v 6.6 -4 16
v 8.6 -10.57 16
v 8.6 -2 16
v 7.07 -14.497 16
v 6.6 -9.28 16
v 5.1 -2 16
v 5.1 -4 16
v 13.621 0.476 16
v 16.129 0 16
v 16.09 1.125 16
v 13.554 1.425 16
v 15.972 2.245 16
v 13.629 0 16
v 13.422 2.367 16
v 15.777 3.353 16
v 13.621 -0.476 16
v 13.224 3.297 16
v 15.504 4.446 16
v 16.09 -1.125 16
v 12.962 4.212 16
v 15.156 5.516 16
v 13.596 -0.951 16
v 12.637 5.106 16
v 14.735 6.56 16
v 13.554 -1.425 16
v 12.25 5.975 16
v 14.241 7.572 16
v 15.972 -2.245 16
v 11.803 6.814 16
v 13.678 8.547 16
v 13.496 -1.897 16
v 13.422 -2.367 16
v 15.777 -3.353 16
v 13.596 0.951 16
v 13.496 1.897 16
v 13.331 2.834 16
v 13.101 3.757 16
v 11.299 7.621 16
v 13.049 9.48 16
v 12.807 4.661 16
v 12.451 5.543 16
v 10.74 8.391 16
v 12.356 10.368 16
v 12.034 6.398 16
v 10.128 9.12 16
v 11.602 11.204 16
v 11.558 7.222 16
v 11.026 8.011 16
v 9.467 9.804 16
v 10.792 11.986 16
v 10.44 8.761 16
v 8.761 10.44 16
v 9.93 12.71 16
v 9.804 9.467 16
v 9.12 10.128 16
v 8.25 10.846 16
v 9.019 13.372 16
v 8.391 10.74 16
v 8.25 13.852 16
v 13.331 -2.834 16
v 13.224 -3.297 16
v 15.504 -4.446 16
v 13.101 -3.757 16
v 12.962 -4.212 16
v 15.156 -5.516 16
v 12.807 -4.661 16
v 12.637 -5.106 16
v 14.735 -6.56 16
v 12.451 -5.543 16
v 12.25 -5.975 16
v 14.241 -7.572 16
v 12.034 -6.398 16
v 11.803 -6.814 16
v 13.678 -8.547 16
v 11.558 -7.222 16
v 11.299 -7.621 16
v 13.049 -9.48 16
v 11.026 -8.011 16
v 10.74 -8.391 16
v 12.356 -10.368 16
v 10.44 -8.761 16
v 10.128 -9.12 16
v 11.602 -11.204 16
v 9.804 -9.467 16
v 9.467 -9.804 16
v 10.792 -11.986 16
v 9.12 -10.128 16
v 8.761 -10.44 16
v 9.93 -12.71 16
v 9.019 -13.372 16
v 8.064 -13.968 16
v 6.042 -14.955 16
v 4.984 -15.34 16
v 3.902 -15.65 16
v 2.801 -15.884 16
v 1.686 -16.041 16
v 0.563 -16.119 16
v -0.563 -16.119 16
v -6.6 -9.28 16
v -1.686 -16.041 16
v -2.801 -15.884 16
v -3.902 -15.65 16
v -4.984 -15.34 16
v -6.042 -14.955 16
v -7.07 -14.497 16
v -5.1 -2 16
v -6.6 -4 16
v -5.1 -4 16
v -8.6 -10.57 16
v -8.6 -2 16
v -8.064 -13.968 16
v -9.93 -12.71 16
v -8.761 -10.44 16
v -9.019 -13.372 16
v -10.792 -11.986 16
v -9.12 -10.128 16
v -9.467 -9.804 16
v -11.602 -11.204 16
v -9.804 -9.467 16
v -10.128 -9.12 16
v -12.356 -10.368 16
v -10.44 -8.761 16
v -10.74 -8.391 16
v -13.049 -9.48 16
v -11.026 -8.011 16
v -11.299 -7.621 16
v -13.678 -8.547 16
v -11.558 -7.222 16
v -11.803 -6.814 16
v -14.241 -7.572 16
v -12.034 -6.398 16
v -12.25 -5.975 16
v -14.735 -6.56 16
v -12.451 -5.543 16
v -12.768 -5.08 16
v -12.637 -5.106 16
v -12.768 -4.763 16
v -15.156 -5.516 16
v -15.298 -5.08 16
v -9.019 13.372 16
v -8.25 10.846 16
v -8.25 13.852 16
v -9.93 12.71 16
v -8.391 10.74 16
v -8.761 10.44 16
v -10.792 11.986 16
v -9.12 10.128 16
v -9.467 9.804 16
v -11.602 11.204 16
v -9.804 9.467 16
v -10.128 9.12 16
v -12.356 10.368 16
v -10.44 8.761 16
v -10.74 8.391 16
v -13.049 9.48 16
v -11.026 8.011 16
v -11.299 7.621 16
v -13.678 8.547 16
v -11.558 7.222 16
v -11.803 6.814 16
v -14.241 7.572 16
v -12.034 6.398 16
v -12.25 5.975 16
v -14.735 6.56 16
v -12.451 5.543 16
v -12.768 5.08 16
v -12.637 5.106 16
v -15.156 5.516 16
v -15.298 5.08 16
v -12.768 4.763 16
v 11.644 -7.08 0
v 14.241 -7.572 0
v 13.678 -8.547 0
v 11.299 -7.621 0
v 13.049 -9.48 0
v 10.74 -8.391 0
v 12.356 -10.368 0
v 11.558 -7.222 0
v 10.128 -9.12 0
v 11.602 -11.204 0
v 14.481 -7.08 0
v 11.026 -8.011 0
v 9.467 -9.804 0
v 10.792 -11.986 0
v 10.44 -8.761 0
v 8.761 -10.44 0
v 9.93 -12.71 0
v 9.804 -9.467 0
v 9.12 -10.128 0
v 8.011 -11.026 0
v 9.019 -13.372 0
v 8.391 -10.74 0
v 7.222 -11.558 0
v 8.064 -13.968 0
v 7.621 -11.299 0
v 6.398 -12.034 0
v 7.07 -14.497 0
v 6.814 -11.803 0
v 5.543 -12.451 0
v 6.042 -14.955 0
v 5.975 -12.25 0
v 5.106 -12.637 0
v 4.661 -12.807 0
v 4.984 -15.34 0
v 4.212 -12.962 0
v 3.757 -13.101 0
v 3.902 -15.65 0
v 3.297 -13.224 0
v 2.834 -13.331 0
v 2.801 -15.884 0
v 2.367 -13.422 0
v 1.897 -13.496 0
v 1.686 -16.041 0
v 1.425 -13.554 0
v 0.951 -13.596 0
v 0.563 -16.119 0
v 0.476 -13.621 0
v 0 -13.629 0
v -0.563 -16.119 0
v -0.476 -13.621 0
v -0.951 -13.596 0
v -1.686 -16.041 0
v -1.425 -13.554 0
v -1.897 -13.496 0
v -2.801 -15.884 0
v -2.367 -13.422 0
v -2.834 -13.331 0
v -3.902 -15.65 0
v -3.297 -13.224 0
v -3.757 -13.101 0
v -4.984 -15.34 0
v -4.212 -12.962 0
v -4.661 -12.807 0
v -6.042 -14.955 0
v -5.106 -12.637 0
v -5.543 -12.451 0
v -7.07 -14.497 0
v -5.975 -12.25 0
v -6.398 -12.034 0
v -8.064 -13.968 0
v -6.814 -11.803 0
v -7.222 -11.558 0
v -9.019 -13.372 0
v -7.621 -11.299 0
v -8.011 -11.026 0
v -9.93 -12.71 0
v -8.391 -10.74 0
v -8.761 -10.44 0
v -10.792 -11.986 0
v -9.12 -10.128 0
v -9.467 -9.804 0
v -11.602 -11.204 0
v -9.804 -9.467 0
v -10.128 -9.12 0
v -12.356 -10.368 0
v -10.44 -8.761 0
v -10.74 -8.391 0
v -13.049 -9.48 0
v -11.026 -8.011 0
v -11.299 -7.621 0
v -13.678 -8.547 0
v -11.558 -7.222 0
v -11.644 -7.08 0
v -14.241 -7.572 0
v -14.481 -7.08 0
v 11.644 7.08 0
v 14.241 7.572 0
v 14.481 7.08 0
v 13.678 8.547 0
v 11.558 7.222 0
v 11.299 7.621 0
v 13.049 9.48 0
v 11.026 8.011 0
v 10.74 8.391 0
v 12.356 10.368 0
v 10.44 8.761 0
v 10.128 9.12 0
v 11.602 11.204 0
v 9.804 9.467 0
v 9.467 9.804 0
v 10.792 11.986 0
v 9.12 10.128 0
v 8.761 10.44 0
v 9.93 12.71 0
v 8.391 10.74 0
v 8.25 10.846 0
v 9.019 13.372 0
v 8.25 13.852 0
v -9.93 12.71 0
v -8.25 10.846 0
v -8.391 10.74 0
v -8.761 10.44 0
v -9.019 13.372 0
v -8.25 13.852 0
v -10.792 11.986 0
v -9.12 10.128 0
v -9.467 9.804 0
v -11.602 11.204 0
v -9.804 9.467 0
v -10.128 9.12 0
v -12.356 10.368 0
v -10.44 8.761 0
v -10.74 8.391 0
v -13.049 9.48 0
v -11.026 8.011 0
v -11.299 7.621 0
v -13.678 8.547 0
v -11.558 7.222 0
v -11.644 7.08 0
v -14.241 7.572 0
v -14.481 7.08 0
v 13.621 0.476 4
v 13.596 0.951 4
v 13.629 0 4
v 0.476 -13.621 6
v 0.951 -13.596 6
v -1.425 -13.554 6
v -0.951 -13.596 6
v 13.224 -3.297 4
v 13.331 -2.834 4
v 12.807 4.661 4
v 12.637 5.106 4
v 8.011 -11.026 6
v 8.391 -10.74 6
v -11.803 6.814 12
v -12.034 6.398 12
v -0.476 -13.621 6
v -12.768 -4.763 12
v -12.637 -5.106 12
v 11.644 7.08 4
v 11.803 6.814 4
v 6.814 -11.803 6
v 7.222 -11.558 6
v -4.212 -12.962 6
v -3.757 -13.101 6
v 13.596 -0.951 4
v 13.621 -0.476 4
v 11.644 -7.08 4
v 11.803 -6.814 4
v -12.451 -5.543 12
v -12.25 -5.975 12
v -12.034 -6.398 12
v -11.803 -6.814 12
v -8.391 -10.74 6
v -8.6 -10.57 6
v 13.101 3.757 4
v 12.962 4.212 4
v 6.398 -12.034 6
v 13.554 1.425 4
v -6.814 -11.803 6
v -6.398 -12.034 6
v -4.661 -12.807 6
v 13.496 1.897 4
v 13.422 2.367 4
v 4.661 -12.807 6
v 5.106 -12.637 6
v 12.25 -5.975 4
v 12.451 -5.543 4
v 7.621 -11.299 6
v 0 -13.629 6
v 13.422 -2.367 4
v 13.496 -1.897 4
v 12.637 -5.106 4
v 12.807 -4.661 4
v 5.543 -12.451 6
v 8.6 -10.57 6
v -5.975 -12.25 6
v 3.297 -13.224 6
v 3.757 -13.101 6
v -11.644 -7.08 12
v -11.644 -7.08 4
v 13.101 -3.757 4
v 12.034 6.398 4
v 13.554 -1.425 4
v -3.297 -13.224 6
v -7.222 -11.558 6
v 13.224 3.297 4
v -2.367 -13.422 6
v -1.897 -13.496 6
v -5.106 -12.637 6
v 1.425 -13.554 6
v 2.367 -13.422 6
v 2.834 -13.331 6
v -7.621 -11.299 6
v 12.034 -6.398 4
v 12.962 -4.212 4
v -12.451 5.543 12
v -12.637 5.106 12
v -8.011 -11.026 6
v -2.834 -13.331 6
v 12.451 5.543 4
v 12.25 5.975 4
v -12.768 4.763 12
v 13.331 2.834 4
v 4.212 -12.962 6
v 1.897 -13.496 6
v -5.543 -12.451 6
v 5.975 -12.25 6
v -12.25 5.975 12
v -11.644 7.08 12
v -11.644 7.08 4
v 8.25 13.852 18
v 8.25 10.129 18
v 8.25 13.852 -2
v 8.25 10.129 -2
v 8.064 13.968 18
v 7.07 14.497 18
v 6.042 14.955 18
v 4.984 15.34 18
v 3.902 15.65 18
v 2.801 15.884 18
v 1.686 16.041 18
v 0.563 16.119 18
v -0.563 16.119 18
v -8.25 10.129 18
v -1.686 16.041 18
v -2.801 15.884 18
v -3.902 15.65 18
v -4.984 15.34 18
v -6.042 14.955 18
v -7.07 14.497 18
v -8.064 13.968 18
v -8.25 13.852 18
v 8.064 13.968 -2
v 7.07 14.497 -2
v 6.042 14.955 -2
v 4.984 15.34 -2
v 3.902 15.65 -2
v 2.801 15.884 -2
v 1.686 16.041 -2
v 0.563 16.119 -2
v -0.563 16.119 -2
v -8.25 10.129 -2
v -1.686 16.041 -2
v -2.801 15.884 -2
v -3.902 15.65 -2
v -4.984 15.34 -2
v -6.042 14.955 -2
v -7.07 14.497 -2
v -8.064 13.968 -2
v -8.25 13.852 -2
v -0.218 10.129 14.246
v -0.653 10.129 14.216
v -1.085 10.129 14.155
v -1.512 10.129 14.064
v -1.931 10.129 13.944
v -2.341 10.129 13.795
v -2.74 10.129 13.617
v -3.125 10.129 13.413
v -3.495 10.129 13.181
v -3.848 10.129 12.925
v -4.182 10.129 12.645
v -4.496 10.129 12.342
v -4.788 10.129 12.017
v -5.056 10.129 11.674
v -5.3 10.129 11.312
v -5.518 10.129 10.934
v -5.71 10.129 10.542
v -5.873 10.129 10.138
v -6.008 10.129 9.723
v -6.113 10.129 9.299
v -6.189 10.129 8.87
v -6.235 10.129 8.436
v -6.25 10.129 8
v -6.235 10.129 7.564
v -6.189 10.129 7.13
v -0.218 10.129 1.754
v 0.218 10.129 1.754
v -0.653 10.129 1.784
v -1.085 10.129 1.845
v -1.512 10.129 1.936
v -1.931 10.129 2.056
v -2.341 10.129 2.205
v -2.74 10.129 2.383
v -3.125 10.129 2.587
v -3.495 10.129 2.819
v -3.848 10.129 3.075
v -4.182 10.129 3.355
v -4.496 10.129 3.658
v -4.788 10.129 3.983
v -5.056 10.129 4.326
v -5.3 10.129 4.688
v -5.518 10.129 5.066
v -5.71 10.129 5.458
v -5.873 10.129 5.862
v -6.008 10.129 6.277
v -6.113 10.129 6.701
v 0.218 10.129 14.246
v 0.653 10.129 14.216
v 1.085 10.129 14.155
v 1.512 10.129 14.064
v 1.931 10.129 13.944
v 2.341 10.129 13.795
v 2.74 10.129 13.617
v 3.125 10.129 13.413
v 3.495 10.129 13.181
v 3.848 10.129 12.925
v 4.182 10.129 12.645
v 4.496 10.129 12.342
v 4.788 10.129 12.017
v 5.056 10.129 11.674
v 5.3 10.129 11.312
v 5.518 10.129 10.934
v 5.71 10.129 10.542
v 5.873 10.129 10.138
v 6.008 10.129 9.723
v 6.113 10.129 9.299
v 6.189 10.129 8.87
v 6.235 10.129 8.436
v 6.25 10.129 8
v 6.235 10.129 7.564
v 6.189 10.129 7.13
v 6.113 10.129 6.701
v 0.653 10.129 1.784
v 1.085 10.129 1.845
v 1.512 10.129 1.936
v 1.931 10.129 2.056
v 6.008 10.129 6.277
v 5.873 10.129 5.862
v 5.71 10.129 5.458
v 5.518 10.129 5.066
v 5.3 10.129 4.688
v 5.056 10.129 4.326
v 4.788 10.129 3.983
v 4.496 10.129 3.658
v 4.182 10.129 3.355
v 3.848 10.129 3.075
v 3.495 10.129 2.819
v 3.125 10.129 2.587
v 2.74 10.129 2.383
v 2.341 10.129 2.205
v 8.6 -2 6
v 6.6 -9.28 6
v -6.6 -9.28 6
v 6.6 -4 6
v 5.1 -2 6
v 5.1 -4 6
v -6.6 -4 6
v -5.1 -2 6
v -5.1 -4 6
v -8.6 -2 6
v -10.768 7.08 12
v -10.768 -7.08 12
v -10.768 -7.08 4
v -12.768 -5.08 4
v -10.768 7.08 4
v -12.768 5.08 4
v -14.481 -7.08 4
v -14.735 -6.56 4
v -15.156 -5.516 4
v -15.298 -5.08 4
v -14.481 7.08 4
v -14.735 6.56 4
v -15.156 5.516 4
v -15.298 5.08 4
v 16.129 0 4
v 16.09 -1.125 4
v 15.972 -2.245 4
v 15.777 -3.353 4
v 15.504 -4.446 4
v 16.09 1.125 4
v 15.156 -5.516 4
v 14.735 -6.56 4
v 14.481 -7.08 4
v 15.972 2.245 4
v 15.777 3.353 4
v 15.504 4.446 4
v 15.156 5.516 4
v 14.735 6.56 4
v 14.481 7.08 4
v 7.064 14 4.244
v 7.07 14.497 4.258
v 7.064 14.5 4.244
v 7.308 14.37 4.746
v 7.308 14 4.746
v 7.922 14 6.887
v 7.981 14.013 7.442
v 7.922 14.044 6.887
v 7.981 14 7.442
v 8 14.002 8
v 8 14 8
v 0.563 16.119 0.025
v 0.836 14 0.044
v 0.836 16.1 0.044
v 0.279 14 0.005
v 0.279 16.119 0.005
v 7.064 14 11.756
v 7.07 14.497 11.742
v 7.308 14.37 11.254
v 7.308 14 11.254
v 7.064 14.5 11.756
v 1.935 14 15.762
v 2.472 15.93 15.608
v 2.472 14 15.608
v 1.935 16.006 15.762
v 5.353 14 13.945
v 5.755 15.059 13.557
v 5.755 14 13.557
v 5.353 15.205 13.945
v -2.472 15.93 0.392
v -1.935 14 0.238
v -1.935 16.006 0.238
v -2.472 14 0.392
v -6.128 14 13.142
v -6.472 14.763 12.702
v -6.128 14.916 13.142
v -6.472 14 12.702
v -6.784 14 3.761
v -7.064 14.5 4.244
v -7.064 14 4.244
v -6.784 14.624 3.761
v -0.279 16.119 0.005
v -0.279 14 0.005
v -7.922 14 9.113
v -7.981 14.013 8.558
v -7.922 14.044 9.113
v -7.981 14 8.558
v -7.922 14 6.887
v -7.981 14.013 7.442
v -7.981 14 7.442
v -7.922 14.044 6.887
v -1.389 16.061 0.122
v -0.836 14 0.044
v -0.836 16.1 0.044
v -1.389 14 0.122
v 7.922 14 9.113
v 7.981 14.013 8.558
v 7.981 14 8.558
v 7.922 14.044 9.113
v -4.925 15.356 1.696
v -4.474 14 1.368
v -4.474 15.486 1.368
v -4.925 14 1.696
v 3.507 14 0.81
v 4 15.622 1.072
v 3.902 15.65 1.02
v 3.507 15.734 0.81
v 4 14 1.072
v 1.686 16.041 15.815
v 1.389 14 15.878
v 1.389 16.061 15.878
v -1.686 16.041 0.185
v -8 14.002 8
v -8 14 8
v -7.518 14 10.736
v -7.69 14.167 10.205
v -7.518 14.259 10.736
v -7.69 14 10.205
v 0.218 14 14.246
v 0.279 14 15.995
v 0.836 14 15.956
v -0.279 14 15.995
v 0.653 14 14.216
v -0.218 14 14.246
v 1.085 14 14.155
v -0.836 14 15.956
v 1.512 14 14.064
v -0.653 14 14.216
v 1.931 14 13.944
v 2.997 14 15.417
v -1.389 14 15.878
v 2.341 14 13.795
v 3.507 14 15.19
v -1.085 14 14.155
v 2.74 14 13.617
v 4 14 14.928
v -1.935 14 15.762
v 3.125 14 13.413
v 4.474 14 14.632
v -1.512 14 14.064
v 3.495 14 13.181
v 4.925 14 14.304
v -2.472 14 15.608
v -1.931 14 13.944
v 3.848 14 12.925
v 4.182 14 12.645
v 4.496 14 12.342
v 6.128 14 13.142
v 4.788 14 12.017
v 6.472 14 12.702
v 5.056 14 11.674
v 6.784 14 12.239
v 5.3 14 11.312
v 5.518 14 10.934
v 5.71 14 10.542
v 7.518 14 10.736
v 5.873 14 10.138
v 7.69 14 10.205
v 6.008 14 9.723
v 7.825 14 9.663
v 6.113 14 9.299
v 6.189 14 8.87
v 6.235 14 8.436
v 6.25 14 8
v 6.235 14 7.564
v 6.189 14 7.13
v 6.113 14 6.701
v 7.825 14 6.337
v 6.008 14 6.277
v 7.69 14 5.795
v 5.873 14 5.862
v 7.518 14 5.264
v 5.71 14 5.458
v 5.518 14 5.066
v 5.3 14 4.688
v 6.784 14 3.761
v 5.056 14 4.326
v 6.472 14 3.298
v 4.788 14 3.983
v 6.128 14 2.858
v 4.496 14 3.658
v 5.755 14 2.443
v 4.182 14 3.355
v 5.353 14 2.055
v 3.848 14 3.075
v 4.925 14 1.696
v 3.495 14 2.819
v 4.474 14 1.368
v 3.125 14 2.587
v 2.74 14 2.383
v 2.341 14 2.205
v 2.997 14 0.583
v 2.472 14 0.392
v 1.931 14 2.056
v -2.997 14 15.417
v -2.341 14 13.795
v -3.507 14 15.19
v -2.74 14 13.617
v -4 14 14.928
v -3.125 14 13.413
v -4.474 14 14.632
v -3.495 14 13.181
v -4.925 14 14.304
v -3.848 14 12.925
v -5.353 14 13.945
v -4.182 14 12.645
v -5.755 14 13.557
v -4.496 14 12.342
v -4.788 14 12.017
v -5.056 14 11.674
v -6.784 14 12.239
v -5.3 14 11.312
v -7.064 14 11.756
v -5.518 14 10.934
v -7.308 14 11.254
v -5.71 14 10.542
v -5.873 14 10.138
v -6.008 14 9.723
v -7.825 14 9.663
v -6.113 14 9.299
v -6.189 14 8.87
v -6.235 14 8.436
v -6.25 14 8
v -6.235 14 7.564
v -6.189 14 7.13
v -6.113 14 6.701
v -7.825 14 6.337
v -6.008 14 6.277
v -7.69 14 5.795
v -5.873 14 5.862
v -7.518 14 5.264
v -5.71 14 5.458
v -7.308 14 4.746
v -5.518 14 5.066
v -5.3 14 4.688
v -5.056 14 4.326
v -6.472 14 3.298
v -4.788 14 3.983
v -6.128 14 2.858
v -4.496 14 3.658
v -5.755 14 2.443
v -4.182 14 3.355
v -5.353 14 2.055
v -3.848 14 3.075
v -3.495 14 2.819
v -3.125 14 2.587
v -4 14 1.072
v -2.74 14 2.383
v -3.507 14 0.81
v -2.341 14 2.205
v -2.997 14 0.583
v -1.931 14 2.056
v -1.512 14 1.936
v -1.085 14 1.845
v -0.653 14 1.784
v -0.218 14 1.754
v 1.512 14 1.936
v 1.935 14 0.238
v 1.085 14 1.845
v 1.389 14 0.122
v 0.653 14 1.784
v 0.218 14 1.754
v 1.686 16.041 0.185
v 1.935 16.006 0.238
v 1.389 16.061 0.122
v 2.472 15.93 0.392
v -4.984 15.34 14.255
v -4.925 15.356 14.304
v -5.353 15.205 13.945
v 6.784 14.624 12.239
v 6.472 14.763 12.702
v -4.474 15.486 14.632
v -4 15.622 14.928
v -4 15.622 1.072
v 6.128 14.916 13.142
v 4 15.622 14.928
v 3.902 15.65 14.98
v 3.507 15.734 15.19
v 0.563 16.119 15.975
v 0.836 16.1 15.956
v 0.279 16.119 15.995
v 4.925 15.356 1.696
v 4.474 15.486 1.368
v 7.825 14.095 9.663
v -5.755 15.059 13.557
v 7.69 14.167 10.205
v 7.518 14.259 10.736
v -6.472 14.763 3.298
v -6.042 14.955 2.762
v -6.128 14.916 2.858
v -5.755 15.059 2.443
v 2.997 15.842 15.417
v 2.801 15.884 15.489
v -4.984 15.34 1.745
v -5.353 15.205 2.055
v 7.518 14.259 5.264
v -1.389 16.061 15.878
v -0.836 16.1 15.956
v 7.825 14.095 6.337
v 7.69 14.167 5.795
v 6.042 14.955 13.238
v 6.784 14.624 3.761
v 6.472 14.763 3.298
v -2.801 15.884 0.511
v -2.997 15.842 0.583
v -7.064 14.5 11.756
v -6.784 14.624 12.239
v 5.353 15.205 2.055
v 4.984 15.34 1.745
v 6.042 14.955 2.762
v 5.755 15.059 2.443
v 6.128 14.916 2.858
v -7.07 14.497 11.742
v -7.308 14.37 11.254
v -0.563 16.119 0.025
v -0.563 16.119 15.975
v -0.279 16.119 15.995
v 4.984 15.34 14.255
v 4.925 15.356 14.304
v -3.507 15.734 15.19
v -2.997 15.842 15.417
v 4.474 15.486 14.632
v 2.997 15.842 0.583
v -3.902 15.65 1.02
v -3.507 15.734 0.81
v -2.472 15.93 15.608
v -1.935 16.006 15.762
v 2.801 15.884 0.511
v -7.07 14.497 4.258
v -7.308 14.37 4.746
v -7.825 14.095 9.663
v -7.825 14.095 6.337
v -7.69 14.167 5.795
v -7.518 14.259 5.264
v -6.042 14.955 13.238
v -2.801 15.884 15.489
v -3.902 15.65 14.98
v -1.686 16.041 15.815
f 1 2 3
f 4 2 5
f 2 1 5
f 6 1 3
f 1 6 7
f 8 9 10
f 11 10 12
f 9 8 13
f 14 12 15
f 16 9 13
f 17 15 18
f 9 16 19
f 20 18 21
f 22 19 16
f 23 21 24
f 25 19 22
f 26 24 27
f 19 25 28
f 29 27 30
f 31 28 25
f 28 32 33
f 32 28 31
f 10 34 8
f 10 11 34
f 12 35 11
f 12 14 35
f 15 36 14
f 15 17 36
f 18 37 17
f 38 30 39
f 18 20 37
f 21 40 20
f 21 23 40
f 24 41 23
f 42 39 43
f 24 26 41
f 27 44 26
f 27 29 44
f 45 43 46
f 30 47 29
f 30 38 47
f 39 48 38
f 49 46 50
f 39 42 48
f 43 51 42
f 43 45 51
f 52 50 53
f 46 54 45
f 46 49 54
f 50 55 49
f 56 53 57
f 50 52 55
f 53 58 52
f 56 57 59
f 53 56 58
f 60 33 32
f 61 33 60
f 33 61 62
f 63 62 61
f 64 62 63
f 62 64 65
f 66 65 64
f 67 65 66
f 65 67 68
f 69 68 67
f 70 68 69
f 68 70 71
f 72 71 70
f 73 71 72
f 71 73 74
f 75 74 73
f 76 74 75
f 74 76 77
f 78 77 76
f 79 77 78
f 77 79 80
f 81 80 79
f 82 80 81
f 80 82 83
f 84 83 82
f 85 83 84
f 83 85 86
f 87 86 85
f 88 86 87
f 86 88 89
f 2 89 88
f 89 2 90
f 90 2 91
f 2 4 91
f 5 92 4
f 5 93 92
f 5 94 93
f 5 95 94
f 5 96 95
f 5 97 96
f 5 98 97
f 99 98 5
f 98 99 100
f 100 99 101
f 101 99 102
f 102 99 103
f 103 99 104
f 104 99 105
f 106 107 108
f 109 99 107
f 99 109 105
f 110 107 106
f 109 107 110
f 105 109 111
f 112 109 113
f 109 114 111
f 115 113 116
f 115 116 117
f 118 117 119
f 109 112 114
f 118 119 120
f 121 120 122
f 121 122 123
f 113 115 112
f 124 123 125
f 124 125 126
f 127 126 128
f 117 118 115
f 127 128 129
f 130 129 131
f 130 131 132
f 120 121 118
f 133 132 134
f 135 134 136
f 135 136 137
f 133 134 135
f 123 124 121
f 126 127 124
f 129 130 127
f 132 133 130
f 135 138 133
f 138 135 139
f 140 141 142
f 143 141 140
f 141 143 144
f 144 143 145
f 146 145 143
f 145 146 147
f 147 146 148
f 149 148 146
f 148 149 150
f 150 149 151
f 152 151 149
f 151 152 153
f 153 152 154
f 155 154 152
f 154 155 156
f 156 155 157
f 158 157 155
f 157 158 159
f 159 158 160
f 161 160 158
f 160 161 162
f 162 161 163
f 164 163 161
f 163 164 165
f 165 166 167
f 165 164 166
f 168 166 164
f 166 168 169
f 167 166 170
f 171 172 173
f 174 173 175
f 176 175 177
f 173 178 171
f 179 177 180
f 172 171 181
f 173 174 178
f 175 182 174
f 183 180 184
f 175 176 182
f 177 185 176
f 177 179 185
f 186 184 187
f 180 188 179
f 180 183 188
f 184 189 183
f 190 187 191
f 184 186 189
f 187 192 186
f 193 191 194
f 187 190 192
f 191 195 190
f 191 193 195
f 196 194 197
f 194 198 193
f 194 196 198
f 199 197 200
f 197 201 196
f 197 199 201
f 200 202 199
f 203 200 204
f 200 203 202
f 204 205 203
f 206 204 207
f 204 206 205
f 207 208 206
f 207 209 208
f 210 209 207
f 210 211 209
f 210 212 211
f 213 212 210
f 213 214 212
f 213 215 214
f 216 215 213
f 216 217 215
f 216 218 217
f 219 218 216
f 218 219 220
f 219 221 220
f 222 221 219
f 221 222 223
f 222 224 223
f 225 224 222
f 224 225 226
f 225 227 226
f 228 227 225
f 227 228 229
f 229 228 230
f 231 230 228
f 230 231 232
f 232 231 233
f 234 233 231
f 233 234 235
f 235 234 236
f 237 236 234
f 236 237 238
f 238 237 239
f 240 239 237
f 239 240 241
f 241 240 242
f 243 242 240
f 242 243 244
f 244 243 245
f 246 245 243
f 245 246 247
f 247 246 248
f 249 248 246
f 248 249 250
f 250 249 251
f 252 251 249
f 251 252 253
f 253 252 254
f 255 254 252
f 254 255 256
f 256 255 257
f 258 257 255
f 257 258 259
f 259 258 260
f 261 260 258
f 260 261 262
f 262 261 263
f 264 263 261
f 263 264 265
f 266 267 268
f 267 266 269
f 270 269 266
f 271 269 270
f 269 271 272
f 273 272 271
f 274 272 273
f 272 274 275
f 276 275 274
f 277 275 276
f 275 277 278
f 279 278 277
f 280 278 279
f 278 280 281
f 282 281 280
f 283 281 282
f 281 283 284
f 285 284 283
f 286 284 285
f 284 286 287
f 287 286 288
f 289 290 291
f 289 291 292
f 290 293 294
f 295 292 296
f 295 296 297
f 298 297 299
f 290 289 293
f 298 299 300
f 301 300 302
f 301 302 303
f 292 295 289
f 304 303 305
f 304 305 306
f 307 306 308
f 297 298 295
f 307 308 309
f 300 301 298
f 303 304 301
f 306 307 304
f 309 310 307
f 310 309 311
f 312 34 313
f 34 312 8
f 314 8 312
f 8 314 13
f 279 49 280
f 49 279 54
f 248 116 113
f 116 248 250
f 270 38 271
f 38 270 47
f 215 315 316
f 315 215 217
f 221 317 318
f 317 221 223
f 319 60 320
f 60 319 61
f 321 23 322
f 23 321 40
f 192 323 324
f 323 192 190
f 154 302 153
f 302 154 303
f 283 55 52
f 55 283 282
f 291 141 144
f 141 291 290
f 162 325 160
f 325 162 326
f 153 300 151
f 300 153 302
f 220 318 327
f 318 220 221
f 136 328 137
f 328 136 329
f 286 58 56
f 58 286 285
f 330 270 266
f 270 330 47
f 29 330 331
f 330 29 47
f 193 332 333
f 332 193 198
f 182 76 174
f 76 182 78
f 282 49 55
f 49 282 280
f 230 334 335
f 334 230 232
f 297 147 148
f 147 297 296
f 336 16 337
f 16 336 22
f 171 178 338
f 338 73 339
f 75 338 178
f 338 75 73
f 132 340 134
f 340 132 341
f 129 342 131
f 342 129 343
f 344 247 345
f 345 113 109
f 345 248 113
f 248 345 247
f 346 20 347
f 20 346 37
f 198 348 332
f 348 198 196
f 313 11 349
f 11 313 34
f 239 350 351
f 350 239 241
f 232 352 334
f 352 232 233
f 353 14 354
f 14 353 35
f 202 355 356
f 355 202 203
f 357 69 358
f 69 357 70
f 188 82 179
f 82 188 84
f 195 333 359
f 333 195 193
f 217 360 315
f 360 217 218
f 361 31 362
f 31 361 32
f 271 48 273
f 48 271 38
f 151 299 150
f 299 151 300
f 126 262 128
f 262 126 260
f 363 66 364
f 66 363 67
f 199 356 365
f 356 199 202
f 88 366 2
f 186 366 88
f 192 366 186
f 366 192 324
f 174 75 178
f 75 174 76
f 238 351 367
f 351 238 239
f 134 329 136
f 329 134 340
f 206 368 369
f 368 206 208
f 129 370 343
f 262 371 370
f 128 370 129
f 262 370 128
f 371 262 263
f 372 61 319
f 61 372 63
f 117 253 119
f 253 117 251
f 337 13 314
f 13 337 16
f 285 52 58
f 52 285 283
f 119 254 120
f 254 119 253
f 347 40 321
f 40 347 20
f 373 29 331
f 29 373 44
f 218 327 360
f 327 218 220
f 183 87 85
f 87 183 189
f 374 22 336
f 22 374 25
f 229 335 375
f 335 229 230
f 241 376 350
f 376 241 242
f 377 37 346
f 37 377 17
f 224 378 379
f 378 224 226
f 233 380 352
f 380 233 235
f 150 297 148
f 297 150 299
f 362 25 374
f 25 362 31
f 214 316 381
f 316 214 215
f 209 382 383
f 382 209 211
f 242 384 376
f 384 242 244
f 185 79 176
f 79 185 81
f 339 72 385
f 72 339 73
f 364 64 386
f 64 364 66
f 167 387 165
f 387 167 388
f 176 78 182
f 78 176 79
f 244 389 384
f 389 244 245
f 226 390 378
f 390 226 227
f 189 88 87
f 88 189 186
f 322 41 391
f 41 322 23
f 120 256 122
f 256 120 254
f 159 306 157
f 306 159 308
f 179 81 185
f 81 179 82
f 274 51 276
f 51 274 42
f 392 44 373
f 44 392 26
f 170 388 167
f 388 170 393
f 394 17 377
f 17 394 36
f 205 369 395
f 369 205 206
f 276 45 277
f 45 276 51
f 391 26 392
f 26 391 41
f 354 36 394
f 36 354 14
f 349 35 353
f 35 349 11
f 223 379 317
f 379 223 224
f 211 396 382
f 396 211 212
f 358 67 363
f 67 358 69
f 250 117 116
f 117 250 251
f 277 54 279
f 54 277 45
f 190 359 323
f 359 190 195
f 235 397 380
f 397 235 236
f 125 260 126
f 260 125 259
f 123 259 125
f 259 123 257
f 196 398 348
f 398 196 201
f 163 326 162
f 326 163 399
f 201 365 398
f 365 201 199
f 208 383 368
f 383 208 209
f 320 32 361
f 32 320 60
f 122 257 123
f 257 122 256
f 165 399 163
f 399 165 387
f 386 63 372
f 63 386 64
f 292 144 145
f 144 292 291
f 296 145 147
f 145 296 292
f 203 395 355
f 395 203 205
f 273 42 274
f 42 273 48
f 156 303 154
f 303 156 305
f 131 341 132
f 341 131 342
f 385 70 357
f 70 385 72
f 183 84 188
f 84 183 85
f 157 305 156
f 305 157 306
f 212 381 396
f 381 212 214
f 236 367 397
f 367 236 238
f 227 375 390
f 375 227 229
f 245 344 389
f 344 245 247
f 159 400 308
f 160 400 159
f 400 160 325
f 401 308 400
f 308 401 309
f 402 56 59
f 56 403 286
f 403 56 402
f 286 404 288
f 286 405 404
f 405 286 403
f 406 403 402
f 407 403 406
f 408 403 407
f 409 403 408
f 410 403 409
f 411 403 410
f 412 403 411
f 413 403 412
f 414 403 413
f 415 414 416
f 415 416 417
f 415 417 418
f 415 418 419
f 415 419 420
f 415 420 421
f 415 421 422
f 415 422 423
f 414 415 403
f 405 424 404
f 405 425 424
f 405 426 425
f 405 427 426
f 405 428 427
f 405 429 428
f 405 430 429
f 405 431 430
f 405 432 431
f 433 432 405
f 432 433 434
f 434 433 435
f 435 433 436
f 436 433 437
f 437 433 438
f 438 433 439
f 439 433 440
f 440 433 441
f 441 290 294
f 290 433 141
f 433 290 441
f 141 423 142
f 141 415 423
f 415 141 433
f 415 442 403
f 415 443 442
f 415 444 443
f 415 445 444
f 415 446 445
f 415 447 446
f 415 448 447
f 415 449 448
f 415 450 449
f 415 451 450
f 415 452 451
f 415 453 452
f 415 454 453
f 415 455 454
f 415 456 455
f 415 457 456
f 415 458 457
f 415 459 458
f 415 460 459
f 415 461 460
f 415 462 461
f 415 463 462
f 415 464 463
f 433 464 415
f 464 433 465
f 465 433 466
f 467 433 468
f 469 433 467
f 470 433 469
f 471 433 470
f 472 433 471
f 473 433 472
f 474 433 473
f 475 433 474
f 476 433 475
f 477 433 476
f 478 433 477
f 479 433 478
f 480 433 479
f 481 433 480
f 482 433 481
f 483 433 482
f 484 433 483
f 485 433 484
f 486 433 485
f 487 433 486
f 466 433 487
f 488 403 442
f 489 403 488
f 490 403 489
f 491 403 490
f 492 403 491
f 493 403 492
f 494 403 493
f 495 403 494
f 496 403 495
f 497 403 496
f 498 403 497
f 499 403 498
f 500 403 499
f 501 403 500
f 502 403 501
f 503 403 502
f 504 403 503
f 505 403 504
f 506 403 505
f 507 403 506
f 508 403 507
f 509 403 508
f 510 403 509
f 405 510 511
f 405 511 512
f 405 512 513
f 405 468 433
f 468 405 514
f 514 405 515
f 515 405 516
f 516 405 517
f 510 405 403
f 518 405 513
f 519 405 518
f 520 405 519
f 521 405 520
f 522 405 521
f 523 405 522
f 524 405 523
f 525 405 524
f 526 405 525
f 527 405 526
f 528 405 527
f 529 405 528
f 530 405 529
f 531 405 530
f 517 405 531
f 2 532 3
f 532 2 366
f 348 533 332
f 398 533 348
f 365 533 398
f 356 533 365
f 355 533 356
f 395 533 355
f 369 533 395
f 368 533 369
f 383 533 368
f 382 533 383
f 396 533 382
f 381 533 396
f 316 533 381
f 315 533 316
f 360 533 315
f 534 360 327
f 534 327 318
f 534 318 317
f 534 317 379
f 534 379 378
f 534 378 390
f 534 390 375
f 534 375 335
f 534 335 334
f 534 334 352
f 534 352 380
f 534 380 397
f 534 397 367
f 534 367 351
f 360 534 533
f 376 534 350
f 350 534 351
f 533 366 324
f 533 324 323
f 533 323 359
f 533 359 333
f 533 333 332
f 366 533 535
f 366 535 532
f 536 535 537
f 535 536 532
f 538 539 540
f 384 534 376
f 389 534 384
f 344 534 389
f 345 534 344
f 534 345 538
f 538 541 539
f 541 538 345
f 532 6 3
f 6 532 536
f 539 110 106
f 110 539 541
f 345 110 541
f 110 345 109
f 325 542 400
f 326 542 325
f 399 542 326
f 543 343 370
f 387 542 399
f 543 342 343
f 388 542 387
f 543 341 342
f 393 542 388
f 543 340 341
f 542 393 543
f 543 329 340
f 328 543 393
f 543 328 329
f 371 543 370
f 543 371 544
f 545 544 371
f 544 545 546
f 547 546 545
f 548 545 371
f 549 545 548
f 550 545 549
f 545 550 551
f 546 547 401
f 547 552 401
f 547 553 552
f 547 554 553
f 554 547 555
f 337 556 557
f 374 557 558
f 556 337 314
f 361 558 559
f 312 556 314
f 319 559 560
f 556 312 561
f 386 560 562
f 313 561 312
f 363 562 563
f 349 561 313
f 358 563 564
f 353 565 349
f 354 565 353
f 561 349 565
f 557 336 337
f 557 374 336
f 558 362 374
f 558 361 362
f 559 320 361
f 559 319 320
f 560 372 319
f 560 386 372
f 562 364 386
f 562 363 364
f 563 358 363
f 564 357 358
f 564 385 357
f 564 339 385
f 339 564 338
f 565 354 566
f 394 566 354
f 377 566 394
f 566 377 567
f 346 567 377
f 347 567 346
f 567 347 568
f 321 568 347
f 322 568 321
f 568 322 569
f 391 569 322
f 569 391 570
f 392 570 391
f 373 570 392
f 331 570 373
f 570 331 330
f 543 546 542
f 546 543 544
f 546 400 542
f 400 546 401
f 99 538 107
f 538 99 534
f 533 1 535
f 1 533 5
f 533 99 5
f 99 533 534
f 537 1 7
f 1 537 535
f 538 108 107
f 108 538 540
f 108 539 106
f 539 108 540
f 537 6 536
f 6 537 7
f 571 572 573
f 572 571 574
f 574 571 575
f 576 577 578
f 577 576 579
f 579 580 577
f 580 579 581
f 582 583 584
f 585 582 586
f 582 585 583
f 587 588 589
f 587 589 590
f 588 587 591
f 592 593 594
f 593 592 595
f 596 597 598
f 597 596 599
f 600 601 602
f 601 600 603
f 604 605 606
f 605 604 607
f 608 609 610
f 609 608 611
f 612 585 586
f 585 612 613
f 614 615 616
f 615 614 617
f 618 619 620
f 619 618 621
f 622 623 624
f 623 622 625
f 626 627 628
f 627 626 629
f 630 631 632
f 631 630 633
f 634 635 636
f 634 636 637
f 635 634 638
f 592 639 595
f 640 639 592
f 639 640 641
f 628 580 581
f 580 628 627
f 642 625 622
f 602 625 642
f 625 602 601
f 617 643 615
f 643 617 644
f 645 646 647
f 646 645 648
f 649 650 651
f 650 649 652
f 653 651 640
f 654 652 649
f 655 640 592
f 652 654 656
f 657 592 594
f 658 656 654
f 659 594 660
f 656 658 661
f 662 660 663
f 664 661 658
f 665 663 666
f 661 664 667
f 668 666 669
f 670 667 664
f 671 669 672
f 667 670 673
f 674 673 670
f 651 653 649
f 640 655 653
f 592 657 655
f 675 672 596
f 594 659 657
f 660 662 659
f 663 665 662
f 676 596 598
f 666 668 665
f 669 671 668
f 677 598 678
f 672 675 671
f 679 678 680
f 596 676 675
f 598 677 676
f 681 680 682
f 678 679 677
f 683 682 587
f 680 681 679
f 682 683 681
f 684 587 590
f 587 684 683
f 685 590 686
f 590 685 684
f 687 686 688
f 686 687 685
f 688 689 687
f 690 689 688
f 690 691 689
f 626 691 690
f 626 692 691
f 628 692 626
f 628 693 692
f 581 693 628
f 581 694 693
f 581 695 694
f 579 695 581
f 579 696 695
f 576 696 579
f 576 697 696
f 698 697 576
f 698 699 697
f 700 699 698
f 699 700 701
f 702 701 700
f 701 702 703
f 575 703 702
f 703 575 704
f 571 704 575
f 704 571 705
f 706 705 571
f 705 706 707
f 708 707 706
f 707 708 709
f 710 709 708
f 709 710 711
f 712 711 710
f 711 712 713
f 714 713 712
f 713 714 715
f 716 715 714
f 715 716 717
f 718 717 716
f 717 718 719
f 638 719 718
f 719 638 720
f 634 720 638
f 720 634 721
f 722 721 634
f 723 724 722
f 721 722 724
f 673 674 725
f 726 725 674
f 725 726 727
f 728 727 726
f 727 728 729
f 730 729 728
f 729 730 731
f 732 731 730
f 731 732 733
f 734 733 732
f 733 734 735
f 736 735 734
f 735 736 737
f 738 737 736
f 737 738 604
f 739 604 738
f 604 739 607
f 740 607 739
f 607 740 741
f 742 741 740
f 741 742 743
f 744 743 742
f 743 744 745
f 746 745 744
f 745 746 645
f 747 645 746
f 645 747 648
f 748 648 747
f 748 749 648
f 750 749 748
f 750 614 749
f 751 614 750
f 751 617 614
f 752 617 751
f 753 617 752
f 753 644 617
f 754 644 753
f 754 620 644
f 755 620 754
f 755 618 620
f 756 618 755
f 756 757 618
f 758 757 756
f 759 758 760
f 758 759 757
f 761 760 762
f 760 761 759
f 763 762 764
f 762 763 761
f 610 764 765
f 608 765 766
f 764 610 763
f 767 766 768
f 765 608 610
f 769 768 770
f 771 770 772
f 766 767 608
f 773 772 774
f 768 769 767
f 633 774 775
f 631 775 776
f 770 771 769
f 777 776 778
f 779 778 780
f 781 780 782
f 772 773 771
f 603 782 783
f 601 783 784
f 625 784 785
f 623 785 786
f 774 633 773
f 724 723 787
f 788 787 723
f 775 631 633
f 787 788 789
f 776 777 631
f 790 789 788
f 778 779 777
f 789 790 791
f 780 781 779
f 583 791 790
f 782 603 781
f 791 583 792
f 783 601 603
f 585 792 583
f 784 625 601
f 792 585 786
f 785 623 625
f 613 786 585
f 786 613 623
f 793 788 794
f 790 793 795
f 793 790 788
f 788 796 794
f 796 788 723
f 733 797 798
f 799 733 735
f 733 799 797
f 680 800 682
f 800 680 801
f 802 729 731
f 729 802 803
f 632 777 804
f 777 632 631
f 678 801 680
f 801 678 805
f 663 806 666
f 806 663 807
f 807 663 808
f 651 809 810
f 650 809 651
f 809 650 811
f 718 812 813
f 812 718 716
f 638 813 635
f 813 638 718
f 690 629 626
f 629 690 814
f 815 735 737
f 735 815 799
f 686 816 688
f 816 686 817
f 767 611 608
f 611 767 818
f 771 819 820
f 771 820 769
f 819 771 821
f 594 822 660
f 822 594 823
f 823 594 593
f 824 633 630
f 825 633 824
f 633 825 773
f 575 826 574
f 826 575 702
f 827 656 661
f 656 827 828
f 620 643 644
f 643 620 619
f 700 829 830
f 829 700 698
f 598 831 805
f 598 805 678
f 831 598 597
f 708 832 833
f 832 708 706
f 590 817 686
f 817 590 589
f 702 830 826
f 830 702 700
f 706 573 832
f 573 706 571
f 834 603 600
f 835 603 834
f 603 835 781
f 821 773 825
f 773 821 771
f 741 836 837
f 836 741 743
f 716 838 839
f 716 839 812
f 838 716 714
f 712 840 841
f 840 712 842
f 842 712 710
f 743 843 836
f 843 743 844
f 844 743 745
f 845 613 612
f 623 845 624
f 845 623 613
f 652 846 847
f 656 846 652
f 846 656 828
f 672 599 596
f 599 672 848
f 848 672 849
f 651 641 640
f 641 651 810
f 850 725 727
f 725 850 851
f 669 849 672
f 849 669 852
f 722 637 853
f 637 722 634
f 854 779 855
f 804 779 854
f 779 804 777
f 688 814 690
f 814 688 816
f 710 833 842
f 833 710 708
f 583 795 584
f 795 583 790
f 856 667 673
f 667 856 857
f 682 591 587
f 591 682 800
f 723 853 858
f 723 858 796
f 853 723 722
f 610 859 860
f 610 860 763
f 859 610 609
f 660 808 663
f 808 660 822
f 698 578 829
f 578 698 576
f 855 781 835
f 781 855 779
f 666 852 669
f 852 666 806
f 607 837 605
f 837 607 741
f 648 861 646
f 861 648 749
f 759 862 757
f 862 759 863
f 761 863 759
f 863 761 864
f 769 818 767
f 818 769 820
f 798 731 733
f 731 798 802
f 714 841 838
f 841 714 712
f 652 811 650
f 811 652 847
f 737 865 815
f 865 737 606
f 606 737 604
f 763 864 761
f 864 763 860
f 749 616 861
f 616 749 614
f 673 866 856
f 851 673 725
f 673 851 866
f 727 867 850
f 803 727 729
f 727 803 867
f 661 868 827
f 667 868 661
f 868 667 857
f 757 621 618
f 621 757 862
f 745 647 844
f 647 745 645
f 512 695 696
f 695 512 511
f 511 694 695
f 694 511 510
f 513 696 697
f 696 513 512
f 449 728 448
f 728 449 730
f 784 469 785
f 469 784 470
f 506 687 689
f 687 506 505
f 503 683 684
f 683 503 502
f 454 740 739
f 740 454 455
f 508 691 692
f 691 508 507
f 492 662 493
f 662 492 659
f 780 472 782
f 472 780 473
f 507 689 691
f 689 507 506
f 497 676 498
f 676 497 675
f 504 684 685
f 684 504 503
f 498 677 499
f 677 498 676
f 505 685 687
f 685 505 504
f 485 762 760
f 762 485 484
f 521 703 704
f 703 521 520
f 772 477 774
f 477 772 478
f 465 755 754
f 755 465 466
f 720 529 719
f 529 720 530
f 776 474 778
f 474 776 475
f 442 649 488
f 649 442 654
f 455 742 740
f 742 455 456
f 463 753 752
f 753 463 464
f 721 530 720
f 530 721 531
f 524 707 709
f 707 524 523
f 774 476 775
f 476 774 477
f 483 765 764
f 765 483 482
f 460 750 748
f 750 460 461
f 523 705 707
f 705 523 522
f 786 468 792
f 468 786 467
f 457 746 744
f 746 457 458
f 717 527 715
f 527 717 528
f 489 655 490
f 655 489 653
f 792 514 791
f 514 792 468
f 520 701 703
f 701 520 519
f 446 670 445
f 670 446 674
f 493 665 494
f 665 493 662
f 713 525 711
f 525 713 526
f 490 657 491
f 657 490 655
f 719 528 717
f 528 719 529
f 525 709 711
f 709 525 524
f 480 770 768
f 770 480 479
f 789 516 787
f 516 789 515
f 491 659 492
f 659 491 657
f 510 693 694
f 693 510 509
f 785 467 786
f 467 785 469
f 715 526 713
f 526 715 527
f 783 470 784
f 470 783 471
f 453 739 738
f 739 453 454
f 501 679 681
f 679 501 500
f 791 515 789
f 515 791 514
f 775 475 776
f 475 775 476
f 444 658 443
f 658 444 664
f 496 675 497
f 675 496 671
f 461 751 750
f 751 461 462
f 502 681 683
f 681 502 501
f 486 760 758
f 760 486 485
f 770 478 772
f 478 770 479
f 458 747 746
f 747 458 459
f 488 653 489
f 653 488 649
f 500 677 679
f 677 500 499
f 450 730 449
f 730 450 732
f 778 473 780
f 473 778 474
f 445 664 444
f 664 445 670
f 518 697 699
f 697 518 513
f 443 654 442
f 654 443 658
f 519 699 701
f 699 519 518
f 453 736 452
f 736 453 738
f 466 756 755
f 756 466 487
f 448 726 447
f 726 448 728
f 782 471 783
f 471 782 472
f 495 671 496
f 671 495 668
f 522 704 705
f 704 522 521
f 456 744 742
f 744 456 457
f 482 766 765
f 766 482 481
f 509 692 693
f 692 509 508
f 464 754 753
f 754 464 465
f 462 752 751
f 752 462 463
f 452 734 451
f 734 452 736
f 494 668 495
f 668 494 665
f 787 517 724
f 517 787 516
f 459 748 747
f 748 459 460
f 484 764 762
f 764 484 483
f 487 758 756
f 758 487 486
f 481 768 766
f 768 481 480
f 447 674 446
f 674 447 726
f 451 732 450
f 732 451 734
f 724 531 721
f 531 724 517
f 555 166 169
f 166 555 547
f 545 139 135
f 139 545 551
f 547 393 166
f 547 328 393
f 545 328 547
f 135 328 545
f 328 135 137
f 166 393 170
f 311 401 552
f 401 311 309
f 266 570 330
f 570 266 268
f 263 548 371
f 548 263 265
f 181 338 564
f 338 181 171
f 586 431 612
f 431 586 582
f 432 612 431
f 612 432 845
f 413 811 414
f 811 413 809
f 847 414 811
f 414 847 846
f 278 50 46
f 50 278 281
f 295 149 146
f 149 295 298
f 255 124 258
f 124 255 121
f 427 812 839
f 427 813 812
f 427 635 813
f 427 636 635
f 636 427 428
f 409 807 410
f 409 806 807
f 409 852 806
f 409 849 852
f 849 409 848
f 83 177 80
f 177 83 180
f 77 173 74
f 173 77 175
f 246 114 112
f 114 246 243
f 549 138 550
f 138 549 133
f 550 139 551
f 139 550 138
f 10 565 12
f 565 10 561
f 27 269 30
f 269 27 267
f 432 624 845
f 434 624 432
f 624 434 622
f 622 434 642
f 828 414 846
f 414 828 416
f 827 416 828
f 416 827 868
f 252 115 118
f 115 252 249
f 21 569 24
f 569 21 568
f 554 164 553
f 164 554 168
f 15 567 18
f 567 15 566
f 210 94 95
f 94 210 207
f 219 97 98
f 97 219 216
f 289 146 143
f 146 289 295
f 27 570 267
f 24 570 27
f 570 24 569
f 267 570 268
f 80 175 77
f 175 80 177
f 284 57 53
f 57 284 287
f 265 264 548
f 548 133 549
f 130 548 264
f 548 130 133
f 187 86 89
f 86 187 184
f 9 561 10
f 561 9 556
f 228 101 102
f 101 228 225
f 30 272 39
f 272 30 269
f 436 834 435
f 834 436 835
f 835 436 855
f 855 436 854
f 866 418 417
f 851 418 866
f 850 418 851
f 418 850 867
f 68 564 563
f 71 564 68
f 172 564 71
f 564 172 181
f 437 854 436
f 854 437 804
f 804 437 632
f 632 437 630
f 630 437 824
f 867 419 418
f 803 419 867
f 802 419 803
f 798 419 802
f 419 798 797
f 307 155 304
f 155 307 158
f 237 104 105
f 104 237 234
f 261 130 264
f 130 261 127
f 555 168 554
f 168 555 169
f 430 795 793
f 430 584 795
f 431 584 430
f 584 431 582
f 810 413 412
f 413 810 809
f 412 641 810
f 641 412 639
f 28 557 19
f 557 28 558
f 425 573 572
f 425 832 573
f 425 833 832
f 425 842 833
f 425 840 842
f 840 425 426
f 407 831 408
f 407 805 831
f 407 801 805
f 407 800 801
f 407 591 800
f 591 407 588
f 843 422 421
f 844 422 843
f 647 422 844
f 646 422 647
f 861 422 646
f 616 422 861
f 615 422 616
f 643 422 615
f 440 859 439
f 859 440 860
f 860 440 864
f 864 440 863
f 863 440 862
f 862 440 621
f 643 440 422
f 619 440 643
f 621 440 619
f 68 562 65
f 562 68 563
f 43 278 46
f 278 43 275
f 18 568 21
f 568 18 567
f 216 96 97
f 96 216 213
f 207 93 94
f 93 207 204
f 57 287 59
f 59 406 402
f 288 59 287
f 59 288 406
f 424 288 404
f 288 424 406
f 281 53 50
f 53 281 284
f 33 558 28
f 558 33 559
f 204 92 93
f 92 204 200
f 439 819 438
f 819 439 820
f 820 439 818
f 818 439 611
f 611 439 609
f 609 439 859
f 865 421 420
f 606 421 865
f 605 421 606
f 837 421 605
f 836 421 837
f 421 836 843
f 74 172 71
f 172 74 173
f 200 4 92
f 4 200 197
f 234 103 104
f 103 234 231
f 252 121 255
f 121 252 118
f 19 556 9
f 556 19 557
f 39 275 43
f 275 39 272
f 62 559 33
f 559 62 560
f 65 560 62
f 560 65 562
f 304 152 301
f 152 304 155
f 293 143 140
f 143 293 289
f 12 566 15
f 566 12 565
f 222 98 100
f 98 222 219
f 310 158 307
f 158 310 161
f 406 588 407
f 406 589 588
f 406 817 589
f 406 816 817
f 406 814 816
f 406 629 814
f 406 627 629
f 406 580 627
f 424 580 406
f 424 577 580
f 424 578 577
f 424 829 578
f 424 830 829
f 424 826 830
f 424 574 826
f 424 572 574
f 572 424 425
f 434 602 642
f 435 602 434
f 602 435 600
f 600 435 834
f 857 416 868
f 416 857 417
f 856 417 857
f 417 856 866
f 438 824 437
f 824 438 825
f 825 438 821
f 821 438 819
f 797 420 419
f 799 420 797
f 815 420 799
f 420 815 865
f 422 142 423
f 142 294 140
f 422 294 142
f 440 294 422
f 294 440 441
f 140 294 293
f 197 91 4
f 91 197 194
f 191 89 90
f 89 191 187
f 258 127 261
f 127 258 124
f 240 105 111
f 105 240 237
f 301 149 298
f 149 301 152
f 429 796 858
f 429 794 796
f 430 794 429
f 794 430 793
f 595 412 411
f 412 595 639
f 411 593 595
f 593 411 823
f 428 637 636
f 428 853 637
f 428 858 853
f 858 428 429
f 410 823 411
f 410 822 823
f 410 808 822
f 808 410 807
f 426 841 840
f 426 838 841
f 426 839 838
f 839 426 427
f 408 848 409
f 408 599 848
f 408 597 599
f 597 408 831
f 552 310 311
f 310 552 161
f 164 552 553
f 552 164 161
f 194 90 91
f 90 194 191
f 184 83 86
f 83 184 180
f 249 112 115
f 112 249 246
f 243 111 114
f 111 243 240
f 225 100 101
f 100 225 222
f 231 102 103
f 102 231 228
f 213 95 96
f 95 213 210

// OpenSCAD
// file: dim.scad
FACES 				= 180;
EPSILON 			= 0.1;

INCHES_TO_MM 		= 25.4;
MM_TO_INCHES 		= 1 / INCHES_TO_MM;

// Marks - absolute location.
M_WAY_BACK          = -40;
M_POMMEL            = -37;    // approximate. hard to measure.
M_SPEAKER_BACK      = -36;
M_0                 = 0;        // physical back of the lightsaber main body.
M_AFT_STOP          = 10;
M_DISPLAY           = 14;       // was 15

// GOLD
//M_PORT_CENTER       = 57.5;
// SILVER
M_PORT_CENTER       = 58.0;

M_PORT_BUTTRESS     = 63.5;
M_CRYSTAL_VIEW_CENTER = 93;
M_FRONT_BUTTRESS    = 104.0;

H_FAR               = 200;

// inner diameter of the lightsaber tube.
// shock is constant, within tolerances
D_INNER      		= 32.258;    	// 1.225 -> 1.250 -> 1.270
R_INNER 			= D_INNER / 2;
D_OUTER             = 37.6;
D_AFT               = 25.8;
R_AFT               = D_AFT / 2;
D_AFT_RING          = 33.5;
H_AFT_RING          = 6;
H_AFT_LIP           = 4;

H_SPEAKER = 3.6 + 0.2;  // space for the physical speaker
X_SPEAKER = 20;
Y_SPEAKER = 14.2;   
Y_SPEAKER_INNER = 8.4;  // air channel
H_SPEAKER_HOLDER = H_SPEAKER + 2;

// emitter head
D_EMITTER_RING      = 33.4;

// dimensions of the main ring.
H_RING 				= 16;
T_RING 				= 2.5;

// dimensions of pin holders and pins
PIN	   				= 2.54;
H_PIN_HOLDER 		= 8;
T_PIN_HOLDER_WALL 	= 2;

N_TEETH				= 2;
TEETH_ANGLE			= 90;

// Pin counts:
X_EMITTER 			= 4;
Y_EMITTER 			= 1;

H_BUTTRESS			= 3;       // internal buttress / baffles
W_PCB				= 18;      // This is the pcb width
H_PCB				= 6;       // But the height varies a *lot*
W_CRYSTAL           = 12.1;
H_CRYSTAL           = 9; //8.2;
D_CRYSTAL_TIP       = 5.5;
H_CRYSTAL_HOLDER    = 8.0;
CRYSTAL_Y           = 8;        // offset up of the crystal

DISPLAY_W           = 23;
DISPLAY_L           = 32;
DISPLAY_MOUNT_W     = 17;
DISPLAY_MOUNT_L     = 26;
D_DISPLAY_MOUNT     = 2;
Y_DISPLAY           = 9.5;

D_SWITCH			= 12.5;						// actually 12, by thread.

X_ROD               = 10.5;
Y_ROD               =  3.5;
D_ROD               =  3.4;

H_BATTERY           = 68;
D_BATTERY           = 18.50 + 0.5;    // An 1850. Huh. 
BATTERY_DROP        = 1;

Z_NOTCH             = H_BUTTRESS / 2;
NOTCH_DEPTH         = 2;
NOTCH_WIDTH         = 3;
RAIL_WIDTH          = 4;
NOTCH_ANGLE_0       = 195;
NOTCH_ANGLE_1       = -20;

X_DOTSTAR           = 5.0;  // from spec
Y_DOTSTAR           = 1.4;  // from spec

OFFSET_EMITTER = -PIN + sqrt(R_INNER * R_INNER - PIN * PIN * X_EMITTER * X_EMITTER / 4);

module emitterPin(h, longY)
{
	Y = longY ? 40 : PIN;

    translate([-X_EMITTER * PIN / 2, OFFSET_EMITTER, 0]) {
        cube([X_EMITTER * PIN, Y, h]);
    }	
}

module emitterHolder(h)
{
    translate([-X_EMITTER * PIN / 2, OFFSET_EMITTER, 0]) {
    	translate([-T_PIN_HOLDER_WALL, -T_PIN_HOLDER_WALL, 0]) {
      		cube([X_EMITTER * PIN + T_PIN_HOLDER_WALL*2, PIN + T_PIN_HOLDER_WALL*2, h]);
    	}
    }	
	
}

// Uses the same dimensions as the emitter holder so they 
// can be used interchangeably.
module lock(h)
{
    translate([-X_EMITTER * PIN / 2 - T_PIN_HOLDER_WALL, -20, 0]) {
		cube([X_EMITTER * PIN + T_PIN_HOLDER_WALL * 2, 40, h]);
	}	
}
// file: ../shapes.scad
FACES   = 180;
EPSILON = 0.1;
PIN	    = 2.54;


module tube(_h, _rInner, _rOuter) {
	difference() {
		cylinder(h=_h, r=_rOuter, $fn=FACES);
		translate([0,0,-EPSILON]) {
			cylinder(h=_h + EPSILON*2, r=_rInner, $fn=FACES);
		}
	}
}

module shelf(_r0, _h, _r1) {
	rotate_extrude($fn=FACES) {
		polygon([[_r0, 0], [_r1, _h], [_r0, _h]]);
	}
}


module pinsAtTube(r, h, nX, nY, longY)
{
	OFFSET = sqrt(r * r - PIN * PIN * nX * nX / 4);

	Y = longY ? 40 : PIN * nY;

    translate([-nX * PIN / 2, OFFSET - PIN * nY, 0]) {
        cube([nX * PIN, Y, h]);
    }	
}

module roundedRect(h, d)
{
	$fn=20;

	D0 = d * 0.8;
	D1 = d * 0.2;
	H = h;

	hull()
	{
		translate([-D0/2, -D0/2, 0]) {
			cube([D0, D0, H]);
		}
		translate([-D0/2, -D0/2, 0])  cylinder(d=D1, h=H);
		translate([ D0/2, -D0/2, 0])  cylinder(d=D1, h=H);
		translate([-D0/2,  D0/2, 0])  cylinder(d=D1, h=H);
		translate([ D0/2,  D0/2, 0])  cylinder(d=D1, h=H);
	}
}
// main file
use <../threads.scad>
use <../shapes.scad>
include <dim.scad>

$fn = 90;

X_MC = 5;
Y_MC = 2;
MC_OFFSET = 4;
MC_WIDTH  = X_MC * PIN + 0.5;
MC_HEIGHT = Y_MC * PIN + 0.2;
H_LOCK = 4;
	
module portPin(h)
{	
	translate([-MC_WIDTH/2, MC_OFFSET, 0]) {
		cube(size=[MC_WIDTH, MC_HEIGHT, h]);

        LIP = 1.5;
        translate([LIP, -T_PIN_HOLDER_WALL, 0]) {
            cube(size=[MC_WIDTH - LIP*2, MC_HEIGHT + T_PIN_HOLDER_WALL, h]);
        }
	}
}

module portHolder(h, longY)
{
	Y = longY ? 40 : MC_HEIGHT + T_PIN_HOLDER_WALL*2;

	translate([-MC_WIDTH/2, MC_OFFSET, 0]) {
    	translate([-T_PIN_HOLDER_WALL, -T_PIN_HOLDER_WALL, 0]) {
			cube(size=[MC_WIDTH + T_PIN_HOLDER_WALL*2, Y, h]);
		}
	}
}

// Ring 
intersection()
{
	// Keep everything in the cylinder!
	translate([0, 0, -10]) {
		cylinder(h=H_RING+20, r=D_INNER/2);	
	}
	difference() {
		union() {
			// The ring.
			tube(H_RING, D_INNER/2 - T_RING, D_INNER/2);

			// switch support.
			BUFFER = 2;
			translate([-D_SWITCH/2 - 2, D_INNER/2 - 6, -BUFFER]) {
				cube(size=[D_SWITCH + 4, 10, H_RING + 2 * BUFFER]);
			}

			// Microcontroller port.
			rotate([0, 0, 180]) {
				translate([0, 0, H_RING - H_PIN_HOLDER-2]) {
					portHolder(H_PIN_HOLDER+2, true);
				}
			}
			// Emitter port
			rotate([0, 0, 90]) {
                translate([0, 0, H_LOCK]) {
                    emitterHolder(H_PIN_HOLDER);
                }
			}
            
            // Rod hard point.
            //flip(
            *translate([8, 1, H_RING - H_PIN_HOLDER-2]) {
                cube(size=[10, 10, H_PIN_HOLDER + 2]);
            }
		}

		// Hole drill.
		translate([0, 14, H_RING/2]) {
			rotate([-90, 0, 0]) {
				cylinder(d=16, h=20);
			}
		}

		// Remove switch.
		translate([0, 0, H_RING/2]) {
			rotate([-90, 0, 0]) {
				cylinder(d=D_SWITCH, h=D_INNER/2 + 1);
			}
		}
		// Remove Microcontroller
		rotate([0, 0, 180]) {
			portPin(H_RING);
		}

		// Remove port.
		rotate([0, 0, 90]) {
			emitterPin(H_RING, true);
		}
        
        // Remove lock
		rotate([0, 0, 90]) {
            lock(H_LOCK);
		}

        // Remove rod
        *translate([-X_ROD, Y_ROD, 0]) {
            cylinder(d=D_ROD, h=20, $fn=FACES);
        }

        
	}
}
